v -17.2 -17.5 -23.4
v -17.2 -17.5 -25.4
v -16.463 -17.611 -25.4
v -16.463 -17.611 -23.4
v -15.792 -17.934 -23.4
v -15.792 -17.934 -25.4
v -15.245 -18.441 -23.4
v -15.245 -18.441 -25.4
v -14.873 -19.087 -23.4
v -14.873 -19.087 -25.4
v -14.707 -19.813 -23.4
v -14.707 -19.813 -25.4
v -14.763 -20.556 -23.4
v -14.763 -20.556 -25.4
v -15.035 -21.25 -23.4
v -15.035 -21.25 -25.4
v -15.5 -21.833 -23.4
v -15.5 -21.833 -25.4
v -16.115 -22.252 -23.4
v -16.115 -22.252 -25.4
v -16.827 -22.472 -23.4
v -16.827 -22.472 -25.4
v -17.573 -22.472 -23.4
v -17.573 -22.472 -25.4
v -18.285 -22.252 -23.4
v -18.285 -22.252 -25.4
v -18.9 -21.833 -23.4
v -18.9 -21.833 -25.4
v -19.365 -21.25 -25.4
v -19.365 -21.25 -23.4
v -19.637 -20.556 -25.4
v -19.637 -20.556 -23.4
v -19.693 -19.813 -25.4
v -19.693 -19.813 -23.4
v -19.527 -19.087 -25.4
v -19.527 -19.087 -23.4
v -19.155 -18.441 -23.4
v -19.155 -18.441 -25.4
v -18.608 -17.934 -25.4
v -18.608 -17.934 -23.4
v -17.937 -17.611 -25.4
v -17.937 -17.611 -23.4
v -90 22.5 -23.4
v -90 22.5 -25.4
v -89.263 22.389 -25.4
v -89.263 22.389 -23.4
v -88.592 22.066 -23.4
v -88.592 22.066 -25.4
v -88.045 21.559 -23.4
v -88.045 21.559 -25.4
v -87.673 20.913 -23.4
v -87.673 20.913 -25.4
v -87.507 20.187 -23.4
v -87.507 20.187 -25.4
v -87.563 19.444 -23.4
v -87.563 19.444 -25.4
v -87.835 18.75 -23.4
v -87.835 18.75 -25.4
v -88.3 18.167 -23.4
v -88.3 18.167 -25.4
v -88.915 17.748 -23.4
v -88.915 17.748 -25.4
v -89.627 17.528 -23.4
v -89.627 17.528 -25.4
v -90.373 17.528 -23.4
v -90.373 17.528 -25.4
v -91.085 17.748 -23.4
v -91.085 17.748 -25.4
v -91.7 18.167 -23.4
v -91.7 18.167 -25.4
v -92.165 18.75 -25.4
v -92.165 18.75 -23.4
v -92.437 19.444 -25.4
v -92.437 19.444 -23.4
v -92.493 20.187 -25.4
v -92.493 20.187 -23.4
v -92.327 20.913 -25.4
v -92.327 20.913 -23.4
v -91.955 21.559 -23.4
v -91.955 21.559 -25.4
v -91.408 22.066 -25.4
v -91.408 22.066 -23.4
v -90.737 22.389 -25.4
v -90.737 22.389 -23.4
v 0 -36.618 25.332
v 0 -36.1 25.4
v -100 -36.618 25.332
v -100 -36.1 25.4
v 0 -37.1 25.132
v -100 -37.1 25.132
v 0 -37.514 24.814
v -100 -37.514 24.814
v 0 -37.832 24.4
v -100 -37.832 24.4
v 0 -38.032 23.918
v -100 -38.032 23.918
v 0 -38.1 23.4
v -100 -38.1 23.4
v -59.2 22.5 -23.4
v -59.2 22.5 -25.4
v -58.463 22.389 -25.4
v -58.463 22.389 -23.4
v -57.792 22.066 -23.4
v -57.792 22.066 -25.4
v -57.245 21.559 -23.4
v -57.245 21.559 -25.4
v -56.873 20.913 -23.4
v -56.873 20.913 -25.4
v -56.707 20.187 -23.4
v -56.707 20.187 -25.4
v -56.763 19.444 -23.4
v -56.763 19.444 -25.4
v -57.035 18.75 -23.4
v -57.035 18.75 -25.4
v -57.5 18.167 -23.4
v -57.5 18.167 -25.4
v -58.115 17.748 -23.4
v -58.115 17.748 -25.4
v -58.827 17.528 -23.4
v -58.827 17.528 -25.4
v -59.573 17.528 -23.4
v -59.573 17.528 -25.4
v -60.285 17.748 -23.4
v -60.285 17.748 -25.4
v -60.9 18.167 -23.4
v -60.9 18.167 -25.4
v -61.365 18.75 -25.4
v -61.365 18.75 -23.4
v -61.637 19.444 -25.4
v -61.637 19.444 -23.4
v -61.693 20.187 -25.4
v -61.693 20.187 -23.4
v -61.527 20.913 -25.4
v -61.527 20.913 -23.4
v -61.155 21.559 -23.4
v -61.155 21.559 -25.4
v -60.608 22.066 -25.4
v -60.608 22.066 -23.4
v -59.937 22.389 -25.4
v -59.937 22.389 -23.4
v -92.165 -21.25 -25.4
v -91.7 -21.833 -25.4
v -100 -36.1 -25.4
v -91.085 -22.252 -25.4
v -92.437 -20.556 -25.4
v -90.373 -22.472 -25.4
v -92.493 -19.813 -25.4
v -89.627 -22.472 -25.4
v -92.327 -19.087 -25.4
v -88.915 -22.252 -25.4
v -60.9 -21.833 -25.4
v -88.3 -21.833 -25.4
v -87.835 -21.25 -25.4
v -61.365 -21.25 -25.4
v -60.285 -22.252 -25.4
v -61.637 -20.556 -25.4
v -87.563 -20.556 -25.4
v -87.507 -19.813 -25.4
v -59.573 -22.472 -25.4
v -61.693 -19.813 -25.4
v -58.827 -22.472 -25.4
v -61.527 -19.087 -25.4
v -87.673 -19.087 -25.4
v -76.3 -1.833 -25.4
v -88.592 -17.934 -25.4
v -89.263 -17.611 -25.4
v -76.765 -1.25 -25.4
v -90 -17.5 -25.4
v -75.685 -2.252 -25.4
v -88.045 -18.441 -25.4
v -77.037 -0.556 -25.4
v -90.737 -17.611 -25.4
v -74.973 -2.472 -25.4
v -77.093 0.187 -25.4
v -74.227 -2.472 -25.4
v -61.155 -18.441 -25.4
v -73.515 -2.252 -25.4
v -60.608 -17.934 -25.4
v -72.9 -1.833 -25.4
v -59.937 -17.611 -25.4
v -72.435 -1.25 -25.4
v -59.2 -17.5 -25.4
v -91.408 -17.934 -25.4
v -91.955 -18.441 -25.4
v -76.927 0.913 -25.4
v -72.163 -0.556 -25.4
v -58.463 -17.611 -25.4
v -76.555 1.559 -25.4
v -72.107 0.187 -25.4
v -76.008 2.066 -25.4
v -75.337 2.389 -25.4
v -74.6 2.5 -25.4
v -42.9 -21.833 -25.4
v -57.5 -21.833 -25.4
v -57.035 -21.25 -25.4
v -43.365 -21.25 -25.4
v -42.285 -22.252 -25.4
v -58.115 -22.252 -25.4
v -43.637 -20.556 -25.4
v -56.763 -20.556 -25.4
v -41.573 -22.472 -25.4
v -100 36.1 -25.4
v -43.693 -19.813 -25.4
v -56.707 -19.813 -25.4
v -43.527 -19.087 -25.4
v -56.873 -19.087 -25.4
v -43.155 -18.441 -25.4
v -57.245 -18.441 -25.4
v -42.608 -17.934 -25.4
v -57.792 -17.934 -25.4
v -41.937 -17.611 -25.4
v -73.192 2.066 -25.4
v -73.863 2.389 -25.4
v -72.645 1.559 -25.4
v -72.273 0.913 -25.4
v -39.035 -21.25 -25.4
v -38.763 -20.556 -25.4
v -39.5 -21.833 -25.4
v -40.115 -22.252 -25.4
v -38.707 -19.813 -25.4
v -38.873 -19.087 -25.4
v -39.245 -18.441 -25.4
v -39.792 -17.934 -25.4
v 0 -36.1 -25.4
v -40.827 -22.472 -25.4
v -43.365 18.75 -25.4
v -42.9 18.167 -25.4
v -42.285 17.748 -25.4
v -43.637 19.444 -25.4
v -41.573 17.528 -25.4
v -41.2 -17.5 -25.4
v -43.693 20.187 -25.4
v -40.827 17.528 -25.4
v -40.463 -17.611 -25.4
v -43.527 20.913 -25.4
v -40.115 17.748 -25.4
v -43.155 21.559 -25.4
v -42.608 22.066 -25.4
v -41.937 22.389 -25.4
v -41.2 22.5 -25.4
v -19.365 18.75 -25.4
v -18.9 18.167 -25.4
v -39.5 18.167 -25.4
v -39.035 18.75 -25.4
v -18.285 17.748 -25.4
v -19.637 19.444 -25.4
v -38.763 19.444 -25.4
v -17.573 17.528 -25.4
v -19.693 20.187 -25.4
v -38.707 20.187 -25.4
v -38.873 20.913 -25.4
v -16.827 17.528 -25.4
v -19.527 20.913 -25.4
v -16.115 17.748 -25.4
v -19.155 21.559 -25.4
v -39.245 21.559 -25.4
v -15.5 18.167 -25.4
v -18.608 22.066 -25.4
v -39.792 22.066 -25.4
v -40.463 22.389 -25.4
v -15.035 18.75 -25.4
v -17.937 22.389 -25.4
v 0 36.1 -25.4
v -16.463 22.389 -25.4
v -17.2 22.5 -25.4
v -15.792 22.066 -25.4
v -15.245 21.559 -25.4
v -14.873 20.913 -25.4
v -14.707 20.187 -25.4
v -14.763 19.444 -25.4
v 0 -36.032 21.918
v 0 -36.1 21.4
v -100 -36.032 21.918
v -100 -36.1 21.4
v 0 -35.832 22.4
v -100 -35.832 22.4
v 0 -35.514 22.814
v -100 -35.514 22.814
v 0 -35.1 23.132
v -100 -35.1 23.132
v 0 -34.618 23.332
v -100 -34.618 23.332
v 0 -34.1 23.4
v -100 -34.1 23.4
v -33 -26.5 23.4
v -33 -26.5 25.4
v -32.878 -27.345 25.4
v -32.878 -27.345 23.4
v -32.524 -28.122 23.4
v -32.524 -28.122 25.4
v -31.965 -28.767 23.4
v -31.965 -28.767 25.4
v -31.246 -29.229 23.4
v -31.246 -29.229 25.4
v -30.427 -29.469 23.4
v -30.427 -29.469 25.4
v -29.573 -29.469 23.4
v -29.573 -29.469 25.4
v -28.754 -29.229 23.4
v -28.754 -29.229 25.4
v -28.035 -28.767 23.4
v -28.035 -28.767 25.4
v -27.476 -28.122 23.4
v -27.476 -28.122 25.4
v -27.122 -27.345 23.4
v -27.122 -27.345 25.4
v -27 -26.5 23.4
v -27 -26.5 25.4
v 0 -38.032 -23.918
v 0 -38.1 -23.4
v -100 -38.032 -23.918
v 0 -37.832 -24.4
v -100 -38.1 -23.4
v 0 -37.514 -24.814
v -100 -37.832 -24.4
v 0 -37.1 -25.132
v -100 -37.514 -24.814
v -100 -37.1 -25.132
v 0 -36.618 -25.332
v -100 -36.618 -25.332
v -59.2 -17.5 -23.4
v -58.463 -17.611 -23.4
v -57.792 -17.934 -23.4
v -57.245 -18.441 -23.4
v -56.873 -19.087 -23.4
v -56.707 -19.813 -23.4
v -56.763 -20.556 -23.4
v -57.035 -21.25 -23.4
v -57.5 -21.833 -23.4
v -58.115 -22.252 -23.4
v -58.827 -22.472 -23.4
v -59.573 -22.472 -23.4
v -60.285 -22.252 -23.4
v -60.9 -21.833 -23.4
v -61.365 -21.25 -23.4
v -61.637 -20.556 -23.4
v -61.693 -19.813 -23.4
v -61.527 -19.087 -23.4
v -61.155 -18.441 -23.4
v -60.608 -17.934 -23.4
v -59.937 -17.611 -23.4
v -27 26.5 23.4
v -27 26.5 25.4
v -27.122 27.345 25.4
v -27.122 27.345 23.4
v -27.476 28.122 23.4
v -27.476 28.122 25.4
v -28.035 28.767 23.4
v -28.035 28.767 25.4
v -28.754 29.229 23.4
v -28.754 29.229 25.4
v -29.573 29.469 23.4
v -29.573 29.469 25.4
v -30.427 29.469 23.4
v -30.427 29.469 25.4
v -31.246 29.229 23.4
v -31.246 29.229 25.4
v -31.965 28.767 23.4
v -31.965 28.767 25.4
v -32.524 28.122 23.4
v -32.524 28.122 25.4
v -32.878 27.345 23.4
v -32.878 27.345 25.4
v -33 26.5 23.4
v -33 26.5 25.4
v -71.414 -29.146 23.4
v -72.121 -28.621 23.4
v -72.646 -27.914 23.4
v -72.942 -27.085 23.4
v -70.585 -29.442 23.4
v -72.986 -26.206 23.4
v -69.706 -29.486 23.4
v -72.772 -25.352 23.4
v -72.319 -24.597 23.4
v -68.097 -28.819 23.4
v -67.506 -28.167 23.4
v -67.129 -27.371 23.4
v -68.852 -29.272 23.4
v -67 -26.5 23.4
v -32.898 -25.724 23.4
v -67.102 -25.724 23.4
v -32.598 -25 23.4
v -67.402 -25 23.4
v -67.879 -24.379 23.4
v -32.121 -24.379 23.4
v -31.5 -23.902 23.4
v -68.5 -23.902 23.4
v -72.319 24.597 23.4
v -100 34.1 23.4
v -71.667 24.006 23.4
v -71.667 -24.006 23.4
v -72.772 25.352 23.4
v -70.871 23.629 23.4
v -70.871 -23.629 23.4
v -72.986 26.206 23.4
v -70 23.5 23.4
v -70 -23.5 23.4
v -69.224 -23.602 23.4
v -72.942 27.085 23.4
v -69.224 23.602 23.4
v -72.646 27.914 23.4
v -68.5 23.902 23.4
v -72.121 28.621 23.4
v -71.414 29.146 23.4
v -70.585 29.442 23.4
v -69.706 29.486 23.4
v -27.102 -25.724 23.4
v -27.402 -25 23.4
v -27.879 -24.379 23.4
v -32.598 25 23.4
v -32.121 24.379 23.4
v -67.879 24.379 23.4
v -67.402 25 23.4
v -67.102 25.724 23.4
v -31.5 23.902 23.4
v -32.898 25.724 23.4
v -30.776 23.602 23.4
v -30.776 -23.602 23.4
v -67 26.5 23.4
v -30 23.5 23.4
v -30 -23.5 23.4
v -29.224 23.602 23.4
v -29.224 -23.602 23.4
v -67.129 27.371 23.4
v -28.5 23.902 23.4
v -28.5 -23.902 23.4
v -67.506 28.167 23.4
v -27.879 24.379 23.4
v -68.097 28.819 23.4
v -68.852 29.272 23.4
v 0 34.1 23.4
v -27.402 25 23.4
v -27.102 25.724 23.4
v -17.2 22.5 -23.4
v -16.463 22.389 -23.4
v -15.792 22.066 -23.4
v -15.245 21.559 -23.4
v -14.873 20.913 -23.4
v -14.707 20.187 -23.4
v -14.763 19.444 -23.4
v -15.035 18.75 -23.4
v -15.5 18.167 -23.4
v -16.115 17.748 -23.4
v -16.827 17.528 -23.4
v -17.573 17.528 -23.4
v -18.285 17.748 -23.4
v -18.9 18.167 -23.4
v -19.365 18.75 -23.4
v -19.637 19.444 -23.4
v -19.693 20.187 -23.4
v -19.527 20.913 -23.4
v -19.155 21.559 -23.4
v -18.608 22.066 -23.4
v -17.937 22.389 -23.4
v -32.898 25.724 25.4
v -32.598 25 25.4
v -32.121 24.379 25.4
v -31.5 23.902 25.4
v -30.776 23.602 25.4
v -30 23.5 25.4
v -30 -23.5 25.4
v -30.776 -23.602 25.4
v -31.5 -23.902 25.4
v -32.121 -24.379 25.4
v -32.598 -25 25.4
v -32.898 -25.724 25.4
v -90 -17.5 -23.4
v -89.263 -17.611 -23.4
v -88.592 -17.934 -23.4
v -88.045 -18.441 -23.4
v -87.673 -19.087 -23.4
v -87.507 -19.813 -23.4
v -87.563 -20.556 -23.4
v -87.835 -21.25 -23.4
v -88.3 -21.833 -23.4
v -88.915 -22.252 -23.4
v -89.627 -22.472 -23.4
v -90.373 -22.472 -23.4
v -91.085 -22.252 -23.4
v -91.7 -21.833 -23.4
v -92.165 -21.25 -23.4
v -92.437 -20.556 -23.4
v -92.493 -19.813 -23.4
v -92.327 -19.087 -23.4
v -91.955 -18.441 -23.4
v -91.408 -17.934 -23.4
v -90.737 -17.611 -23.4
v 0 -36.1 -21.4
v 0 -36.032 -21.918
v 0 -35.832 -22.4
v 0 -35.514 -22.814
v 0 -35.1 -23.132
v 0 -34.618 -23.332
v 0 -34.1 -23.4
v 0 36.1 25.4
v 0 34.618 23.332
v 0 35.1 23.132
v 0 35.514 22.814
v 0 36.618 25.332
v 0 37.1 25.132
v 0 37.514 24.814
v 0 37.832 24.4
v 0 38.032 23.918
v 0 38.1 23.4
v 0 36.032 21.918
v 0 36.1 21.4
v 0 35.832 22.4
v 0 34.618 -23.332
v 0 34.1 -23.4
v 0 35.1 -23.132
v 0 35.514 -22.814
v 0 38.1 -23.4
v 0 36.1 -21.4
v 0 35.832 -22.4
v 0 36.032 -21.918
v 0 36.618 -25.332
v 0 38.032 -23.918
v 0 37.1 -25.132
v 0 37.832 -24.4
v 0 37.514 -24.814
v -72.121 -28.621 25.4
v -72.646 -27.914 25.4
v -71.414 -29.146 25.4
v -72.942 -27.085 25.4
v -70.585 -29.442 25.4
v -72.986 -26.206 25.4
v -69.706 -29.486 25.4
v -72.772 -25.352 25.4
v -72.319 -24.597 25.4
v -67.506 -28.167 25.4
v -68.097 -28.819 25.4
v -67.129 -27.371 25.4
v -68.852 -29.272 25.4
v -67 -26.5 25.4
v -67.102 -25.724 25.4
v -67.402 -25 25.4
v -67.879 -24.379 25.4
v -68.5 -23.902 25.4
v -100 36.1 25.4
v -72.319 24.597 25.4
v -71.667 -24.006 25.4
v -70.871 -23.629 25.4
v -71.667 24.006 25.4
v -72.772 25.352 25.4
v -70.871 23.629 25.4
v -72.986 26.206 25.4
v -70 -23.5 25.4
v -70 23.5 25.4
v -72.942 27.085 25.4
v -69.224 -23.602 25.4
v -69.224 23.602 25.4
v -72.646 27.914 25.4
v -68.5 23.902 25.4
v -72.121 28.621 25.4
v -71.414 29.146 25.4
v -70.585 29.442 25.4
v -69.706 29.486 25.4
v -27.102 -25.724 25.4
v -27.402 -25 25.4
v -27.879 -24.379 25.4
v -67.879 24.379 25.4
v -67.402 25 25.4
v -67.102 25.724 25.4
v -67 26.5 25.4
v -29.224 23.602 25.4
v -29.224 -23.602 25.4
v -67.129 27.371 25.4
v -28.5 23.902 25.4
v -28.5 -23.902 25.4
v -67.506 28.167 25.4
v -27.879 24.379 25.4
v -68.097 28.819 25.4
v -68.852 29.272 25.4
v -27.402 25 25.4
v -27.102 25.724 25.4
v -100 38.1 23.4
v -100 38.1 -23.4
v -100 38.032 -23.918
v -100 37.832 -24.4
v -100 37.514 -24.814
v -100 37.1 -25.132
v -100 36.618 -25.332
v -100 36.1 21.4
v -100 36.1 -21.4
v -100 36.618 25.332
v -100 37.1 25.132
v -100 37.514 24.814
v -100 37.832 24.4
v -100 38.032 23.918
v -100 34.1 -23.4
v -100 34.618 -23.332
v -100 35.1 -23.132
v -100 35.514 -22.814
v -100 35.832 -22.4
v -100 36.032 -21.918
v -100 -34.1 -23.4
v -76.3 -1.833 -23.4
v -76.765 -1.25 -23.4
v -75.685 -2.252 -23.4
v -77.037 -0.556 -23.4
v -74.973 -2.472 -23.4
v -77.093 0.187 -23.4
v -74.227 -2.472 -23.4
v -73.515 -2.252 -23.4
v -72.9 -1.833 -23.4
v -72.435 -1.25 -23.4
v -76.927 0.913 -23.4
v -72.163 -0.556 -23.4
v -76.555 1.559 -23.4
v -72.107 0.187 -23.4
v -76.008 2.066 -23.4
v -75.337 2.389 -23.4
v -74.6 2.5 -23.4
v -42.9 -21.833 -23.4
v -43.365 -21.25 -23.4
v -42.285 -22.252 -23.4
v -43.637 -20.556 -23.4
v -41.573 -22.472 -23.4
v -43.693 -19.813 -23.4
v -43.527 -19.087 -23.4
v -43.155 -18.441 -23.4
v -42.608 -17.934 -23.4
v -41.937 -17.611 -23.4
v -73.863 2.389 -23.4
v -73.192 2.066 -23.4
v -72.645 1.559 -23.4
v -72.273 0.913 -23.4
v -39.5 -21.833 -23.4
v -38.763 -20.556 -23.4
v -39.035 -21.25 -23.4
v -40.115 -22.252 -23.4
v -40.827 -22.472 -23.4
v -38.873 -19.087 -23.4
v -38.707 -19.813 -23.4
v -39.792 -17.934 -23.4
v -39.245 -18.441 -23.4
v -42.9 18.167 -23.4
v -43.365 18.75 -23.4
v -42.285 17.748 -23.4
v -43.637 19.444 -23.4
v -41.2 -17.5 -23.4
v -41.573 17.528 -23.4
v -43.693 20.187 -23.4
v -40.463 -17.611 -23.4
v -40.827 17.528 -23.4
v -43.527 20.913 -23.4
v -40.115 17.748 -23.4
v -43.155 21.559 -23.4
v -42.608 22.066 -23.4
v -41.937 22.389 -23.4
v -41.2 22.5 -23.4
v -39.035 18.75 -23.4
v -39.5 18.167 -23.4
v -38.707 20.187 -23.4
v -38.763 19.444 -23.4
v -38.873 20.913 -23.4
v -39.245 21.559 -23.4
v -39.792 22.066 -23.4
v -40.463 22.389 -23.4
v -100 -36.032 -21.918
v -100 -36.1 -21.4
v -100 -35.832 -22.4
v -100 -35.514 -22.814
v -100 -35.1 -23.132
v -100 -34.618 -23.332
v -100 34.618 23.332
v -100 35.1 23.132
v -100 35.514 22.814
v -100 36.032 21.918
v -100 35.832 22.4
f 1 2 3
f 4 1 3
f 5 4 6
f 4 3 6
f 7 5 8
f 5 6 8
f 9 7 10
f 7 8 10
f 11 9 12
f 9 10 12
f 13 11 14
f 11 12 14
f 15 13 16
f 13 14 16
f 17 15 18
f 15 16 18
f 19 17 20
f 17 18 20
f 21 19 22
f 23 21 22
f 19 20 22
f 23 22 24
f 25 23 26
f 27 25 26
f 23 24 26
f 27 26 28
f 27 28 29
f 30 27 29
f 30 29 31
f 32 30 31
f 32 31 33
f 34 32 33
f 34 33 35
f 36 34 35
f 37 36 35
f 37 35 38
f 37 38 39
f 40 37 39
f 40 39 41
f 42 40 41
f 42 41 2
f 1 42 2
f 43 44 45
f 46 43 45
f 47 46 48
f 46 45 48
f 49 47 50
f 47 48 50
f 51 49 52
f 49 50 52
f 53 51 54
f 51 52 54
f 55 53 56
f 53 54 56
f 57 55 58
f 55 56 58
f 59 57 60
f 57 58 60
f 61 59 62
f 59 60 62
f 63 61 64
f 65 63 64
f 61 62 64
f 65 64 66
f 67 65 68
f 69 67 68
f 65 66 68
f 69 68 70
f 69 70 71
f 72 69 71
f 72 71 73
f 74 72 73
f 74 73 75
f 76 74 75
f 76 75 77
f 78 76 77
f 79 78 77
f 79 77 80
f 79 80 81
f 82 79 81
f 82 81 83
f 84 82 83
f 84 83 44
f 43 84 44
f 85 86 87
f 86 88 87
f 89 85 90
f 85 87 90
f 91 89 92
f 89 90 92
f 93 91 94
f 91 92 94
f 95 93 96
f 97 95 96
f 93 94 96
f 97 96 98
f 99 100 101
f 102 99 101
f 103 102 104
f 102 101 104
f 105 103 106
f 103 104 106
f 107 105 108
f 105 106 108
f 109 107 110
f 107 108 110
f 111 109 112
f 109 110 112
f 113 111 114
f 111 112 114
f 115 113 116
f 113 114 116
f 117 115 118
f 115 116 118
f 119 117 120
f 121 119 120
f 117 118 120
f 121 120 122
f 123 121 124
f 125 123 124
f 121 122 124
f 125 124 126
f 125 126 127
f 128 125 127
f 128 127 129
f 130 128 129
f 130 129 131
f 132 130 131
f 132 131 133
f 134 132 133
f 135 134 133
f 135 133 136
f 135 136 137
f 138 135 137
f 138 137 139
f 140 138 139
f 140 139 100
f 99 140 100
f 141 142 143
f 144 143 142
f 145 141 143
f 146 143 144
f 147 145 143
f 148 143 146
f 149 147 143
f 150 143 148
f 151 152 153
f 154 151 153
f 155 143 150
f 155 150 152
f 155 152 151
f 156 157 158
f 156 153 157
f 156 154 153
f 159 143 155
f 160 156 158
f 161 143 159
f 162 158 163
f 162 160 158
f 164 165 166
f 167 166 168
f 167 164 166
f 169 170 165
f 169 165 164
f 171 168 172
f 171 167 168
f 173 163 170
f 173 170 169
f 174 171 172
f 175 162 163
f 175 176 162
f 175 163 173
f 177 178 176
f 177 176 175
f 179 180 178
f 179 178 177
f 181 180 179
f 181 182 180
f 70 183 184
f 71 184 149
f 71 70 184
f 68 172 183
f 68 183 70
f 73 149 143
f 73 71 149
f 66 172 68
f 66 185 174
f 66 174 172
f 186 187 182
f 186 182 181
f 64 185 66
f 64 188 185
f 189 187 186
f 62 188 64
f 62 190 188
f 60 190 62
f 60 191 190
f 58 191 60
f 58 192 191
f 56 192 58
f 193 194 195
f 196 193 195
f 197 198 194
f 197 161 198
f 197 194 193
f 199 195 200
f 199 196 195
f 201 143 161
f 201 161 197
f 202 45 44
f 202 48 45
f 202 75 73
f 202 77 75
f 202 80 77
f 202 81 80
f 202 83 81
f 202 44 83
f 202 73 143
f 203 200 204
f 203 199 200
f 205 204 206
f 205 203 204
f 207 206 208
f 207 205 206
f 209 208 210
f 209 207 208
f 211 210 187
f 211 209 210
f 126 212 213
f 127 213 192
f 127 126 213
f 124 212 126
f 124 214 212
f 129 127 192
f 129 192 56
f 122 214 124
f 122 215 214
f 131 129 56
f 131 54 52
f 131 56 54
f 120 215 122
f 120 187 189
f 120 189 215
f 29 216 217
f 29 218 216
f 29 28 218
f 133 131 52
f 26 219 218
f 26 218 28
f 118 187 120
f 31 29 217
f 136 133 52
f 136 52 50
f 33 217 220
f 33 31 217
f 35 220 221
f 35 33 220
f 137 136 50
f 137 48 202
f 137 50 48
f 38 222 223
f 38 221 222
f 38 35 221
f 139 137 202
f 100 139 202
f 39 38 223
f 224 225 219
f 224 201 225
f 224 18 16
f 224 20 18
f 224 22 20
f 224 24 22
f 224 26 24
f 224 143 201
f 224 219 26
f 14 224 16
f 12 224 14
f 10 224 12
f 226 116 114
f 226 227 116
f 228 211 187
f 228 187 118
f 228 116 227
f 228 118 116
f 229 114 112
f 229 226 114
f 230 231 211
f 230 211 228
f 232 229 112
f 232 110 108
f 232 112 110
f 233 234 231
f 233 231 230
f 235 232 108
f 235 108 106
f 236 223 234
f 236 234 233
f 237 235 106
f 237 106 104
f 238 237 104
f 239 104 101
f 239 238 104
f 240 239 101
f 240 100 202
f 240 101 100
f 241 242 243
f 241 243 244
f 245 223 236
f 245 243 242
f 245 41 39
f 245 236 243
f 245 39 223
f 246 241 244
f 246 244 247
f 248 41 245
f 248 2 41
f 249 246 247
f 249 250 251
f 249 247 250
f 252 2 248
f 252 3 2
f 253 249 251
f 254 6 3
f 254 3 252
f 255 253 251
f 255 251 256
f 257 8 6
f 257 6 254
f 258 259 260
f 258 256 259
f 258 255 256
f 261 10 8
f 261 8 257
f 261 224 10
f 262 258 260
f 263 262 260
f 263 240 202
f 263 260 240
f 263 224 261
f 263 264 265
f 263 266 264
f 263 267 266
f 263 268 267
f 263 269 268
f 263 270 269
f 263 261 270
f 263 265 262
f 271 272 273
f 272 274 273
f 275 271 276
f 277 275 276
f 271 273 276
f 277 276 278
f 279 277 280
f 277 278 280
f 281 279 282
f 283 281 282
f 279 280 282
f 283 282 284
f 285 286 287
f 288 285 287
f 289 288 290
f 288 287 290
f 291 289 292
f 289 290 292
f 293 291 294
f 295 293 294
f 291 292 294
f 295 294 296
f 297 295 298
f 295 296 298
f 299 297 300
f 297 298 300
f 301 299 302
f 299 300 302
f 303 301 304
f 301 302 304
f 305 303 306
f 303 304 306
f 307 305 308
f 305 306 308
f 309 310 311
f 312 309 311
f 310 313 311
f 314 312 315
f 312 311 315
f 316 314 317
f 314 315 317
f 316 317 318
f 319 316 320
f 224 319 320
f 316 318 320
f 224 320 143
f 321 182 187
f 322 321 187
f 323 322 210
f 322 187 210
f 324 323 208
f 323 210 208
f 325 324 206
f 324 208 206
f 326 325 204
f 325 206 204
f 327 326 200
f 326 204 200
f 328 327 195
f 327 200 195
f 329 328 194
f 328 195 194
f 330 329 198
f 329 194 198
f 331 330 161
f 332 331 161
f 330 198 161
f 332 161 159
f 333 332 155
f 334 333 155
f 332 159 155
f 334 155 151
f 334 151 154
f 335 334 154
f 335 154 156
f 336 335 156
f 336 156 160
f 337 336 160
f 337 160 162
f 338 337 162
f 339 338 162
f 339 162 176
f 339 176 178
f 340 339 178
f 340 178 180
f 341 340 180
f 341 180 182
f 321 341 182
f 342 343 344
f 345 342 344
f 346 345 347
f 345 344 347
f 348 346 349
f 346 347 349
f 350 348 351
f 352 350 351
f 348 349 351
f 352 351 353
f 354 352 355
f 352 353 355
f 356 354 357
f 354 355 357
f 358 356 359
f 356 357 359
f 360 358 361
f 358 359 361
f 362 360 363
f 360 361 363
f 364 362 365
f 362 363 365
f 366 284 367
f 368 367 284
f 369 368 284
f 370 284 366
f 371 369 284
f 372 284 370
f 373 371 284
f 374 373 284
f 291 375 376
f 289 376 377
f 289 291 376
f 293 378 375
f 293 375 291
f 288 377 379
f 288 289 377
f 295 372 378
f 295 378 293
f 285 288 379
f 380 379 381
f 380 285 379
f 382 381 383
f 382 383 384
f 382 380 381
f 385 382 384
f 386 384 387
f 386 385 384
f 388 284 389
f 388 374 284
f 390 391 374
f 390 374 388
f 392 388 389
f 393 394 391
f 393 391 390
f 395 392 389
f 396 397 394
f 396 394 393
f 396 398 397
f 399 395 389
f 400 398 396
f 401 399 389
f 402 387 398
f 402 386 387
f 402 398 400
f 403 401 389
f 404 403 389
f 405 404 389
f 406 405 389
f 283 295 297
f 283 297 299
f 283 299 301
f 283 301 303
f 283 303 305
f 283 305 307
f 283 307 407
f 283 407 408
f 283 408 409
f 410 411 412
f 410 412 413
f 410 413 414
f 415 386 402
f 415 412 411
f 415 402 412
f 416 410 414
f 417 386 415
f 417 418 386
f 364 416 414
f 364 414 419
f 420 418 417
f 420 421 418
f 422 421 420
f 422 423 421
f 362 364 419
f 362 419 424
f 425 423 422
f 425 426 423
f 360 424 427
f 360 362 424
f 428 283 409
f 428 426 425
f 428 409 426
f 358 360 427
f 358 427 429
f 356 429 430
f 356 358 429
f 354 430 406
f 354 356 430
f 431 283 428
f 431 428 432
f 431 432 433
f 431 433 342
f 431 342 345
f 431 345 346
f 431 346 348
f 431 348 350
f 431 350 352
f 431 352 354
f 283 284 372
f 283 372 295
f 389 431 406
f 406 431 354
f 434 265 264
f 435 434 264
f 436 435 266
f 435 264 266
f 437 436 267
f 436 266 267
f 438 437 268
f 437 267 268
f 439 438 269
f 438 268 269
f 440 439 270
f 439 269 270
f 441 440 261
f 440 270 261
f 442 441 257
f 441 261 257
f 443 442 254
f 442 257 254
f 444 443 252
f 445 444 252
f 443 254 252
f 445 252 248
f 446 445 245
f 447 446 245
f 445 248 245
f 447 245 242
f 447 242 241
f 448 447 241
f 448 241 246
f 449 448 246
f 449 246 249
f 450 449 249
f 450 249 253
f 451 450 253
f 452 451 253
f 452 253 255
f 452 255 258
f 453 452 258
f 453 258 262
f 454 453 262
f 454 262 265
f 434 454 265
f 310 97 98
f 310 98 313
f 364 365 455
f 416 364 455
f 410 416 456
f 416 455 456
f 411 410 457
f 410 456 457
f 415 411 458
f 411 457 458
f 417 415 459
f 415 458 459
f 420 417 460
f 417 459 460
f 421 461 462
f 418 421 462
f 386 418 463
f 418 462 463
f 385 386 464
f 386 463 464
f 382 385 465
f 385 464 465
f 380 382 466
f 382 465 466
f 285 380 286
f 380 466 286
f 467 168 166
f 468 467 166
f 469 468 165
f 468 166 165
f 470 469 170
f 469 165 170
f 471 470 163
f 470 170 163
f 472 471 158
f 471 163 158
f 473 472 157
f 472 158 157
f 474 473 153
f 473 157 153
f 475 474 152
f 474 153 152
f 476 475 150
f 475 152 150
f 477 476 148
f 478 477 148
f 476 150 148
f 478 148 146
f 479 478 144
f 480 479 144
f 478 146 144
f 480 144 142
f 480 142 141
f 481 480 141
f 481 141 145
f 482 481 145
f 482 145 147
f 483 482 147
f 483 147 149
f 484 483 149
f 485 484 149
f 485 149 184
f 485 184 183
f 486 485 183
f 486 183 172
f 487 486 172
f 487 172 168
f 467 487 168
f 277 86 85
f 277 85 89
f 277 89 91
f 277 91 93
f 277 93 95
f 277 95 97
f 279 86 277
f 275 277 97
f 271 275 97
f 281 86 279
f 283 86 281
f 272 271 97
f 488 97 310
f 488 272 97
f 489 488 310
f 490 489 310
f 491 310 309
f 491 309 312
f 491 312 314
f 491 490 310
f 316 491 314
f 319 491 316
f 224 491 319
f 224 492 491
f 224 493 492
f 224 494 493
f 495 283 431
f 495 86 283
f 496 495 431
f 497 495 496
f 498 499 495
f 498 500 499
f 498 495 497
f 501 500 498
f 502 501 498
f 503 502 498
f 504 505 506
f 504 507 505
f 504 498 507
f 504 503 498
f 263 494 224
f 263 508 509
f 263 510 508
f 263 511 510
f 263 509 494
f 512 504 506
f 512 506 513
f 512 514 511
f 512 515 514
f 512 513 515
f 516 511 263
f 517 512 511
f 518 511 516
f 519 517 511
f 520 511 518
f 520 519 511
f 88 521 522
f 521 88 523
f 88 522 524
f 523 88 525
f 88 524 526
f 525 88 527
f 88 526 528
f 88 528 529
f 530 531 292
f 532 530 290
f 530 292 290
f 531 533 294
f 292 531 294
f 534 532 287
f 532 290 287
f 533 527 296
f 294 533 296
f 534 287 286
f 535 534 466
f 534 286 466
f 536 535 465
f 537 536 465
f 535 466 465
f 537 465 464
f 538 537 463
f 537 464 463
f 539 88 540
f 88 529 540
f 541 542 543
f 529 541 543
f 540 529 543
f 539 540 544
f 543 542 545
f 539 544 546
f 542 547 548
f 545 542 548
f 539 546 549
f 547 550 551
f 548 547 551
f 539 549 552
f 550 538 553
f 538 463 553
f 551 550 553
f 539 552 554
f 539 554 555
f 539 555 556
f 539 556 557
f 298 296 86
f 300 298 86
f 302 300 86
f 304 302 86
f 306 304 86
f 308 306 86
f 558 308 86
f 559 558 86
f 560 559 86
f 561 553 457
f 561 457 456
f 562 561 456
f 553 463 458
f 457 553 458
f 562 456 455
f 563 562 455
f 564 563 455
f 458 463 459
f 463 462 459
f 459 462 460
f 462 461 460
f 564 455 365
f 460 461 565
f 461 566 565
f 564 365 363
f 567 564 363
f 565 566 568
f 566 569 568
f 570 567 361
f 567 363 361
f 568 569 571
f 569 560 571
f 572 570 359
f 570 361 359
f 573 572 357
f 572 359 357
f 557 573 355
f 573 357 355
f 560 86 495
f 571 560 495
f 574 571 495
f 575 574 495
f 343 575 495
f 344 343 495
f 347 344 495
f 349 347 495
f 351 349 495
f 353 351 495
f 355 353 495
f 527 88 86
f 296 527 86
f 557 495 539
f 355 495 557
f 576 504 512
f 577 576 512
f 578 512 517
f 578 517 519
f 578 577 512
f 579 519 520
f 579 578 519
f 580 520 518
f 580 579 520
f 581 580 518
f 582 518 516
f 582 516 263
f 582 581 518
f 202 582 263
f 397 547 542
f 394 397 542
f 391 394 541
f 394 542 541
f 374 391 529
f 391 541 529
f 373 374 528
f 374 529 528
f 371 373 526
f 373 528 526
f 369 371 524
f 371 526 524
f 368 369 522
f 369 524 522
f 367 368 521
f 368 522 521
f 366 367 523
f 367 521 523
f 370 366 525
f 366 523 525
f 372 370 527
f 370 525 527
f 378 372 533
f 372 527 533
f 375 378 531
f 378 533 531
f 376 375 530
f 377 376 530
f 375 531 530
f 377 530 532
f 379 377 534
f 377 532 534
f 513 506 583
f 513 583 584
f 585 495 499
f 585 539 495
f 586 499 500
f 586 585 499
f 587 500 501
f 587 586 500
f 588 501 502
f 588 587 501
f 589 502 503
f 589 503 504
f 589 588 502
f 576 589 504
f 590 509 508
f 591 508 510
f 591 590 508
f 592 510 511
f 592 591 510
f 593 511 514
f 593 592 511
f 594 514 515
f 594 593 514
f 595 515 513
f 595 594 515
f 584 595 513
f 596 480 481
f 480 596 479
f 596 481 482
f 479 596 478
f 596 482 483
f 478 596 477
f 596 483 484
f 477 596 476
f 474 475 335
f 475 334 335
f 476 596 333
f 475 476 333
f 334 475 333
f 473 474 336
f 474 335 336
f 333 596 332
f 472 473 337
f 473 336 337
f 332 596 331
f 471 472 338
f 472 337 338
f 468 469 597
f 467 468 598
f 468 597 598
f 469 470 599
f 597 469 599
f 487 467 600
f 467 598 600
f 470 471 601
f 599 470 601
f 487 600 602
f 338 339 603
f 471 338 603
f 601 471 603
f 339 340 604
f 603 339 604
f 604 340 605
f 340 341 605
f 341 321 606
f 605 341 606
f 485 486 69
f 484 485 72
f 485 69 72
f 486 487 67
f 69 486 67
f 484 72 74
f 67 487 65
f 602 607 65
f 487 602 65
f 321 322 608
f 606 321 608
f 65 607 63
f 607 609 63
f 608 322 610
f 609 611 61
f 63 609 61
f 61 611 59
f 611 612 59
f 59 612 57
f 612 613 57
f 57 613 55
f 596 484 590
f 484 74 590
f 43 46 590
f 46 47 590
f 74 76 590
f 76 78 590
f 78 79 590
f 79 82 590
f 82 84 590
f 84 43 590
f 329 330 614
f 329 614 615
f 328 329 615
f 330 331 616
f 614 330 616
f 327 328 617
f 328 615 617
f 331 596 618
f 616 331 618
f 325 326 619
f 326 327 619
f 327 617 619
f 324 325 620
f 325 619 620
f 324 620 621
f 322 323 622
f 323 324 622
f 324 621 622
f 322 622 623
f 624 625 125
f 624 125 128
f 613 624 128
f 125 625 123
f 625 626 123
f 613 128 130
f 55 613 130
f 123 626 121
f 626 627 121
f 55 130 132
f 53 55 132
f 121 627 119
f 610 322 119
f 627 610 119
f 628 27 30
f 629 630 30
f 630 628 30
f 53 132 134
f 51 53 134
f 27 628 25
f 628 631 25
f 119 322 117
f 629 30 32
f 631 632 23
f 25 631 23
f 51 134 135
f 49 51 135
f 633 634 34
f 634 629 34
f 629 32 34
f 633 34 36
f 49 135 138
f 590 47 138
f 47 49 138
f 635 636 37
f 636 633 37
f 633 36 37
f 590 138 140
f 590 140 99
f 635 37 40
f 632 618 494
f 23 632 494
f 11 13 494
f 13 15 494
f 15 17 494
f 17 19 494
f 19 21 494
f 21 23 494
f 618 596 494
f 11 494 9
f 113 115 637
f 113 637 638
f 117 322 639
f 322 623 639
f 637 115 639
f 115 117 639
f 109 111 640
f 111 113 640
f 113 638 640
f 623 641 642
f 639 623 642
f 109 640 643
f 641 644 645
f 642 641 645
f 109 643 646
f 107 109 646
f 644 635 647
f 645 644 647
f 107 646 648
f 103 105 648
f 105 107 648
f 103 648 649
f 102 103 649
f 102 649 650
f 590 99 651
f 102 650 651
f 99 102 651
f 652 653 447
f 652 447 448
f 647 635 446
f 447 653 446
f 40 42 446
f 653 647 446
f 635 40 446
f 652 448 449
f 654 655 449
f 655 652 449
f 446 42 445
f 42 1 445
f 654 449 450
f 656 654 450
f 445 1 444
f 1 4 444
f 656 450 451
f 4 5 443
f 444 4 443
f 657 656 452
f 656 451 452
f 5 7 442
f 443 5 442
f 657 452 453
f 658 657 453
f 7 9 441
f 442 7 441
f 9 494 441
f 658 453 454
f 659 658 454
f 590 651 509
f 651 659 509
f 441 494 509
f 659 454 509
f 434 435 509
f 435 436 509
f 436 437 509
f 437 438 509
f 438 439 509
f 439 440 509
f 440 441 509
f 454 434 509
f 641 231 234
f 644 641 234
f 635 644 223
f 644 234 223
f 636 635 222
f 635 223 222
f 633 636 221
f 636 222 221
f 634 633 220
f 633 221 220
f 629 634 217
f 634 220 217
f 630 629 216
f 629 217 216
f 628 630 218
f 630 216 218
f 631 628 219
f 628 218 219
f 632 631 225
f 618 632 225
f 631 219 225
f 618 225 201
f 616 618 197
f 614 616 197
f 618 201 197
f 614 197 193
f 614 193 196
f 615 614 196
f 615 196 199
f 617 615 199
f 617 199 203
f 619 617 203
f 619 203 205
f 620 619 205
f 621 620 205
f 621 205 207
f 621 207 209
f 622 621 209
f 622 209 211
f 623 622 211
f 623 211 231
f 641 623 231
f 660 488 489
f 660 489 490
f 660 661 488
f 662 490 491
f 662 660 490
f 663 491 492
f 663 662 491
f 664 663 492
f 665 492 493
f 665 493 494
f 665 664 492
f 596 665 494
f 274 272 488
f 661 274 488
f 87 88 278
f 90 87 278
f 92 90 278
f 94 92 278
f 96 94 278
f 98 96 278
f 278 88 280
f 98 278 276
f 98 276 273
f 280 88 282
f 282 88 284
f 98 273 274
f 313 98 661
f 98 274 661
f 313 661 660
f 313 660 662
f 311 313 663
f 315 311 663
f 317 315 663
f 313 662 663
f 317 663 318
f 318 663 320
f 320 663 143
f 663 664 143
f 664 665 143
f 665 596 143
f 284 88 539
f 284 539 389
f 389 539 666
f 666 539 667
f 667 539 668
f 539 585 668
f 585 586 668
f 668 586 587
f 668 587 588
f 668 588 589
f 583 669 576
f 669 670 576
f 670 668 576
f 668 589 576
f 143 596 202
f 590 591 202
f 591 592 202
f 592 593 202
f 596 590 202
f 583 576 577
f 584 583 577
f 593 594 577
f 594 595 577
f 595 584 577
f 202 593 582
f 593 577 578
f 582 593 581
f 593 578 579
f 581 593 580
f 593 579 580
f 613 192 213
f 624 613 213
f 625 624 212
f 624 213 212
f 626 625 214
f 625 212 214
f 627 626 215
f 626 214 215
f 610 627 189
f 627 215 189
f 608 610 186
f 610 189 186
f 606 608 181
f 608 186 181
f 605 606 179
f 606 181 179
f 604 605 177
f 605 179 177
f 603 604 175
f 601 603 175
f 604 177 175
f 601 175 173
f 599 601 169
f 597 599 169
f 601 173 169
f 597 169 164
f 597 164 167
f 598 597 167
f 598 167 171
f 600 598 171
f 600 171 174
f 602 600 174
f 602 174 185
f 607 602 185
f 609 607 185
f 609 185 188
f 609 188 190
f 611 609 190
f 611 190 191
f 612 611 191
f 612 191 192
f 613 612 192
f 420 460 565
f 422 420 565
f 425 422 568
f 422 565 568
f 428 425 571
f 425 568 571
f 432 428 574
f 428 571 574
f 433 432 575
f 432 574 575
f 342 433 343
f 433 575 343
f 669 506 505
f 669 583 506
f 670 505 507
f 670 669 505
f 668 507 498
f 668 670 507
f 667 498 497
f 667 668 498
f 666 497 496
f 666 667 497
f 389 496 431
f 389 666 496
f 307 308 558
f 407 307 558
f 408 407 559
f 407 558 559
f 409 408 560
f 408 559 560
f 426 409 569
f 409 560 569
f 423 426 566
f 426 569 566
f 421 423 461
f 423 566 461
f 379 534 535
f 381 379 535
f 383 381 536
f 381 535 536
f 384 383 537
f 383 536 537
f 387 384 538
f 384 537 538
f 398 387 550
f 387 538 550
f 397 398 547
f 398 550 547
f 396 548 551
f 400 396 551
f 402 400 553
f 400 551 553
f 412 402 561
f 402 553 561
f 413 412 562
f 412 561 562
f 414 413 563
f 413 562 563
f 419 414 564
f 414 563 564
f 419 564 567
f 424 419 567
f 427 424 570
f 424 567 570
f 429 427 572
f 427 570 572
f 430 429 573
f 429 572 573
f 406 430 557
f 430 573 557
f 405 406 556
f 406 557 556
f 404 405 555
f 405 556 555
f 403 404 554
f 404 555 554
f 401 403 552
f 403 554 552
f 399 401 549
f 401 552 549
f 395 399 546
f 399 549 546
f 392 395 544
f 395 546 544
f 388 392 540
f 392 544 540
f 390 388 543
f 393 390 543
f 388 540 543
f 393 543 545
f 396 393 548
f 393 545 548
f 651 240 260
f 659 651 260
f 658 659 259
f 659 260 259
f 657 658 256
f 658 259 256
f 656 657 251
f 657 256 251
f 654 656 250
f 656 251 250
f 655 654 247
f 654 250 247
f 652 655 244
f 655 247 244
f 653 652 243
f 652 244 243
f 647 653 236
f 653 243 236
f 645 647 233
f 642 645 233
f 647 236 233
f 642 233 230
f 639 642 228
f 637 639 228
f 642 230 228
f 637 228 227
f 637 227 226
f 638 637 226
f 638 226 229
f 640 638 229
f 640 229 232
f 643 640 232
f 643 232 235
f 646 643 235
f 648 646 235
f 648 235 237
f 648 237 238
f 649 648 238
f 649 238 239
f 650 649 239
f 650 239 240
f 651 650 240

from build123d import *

# Parameters (mm, degrees)
SKETCH1_W             = 50.8
SKETCH1_H             = 76.2
BOSS_EXTRUDE1_DEPTH   = 100
SKETCH2_W             = 46.8
SKETCH2_H             = 72.2
CUT_EXTRUDE1_DEPTH    = 110.985317202
FILLET2_R             = 2
CORTAR_EXTRUIR2_DEPTH = 10
CROQUIS4_R            = 2.5
CORTAR_EXTRUIR5_DEPTH = 10
CROQUIS6_R            = 2.5
CORTAR_EXTRUIR6_DEPTH = 10


with BuildPart() as part:
    # Sketch1 → Boss-Extrude1 (new body)
    with BuildSketch(Plane(origin=(0, 0, 0), x_dir=(0, 0, -1), z_dir=(1, 0, 0))):
        Rectangle(SKETCH1_W, SKETCH1_H)
    extrude(amount=-BOSS_EXTRUDE1_DEPTH)

    # Sketch2 → Cut-Extrude1 (cut, through all)
    with BuildSketch(Plane(origin=(0, 0, 0), x_dir=(0, 0, -1), z_dir=(1, 0, 0))):
        Rectangle(SKETCH2_W, SKETCH2_H)
    extrude(amount=-CUT_EXTRUDE1_DEPTH, mode=Mode.SUBTRACT)

    # Fillet2
    fillet2_edges = [part.edges().sort_by_distance(p)[0] for p in [
        (-50, -36.1, 23.4),
        (-50, 36.1, 23.4),
        (-50, 36.1, -23.4),
        (-50, -36.1, -23.4),
        (-50, 38.1, 25.4),
        (-50, 38.1, -25.4),
        (-50, -38.1, -25.4),
        (-50, -38.1, 25.4),
    ]]
    fillet(fillet2_edges, radius=FILLET2_R)

    # Croquis2 → Cortar-Extruir2 (cut)
    with BuildSketch(Plane.XY.offset(25.4)):
        with BuildLine():
            ThreePointArc((-27, 26.5), (-30, 29.5), (-33, 26.5))
            Line((-33, 26.5), (-30, 26.5))
            Line((-30, 26.5), (-30, 23.5))
            ThreePointArc((-30, 23.5), (-27.878679656, 24.378679656), (-27, 26.5))
        make_face()
        with BuildLine():
            Line((-30, 26.5), (-33, 26.5))
            ThreePointArc((-33, 26.5), (-32.121320344, 24.378679656), (-30, 23.5))
            Line((-30, 23.5), (-30, 26.5))
        make_face()
        with BuildLine():
            ThreePointArc((-70, 23.5), (-67.878679656, 24.378679656), (-67, 26.5))
            Line((-67, 26.5), (-70, 26.5))
            Line((-70, 26.5), (-70, 23.5))
        make_face()
        with BuildLine():
            Line((-70, 26.5), (-67, 26.5))
            ThreePointArc((-67, 26.5), (-72.121320344, 28.621320344), (-70, 23.5))
            Line((-70, 23.5), (-70, 26.5))
        make_face()
        with BuildLine():
            ThreePointArc((-67, -26.5), (-67.878679656, -24.378679656), (-70, -23.5))
            Line((-70, -23.5), (-70, -26.5))
            Line((-70, -26.5), (-67, -26.5))
        make_face()
        with BuildLine():
            Line((-70, -26.5), (-70, -23.5))
            ThreePointArc((-70, -23.5), (-72.121320344, -28.621320344), (-67, -26.5))
            Line((-67, -26.5), (-70, -26.5))
        make_face()
        with BuildLine():
            ThreePointArc((-27, -26.5), (-27.878679656, -24.378679656), (-30, -23.5))
            Line((-30, -23.5), (-30, -26.5))
            Line((-30, -26.5), (-33, -26.5))
            ThreePointArc((-33, -26.5), (-30, -29.5), (-27, -26.5))
        make_face()
        with BuildLine():
            Line((-30, -26.5), (-30, -23.5))
            ThreePointArc((-30, -23.5), (-32.121320344, -24.378679656), (-33, -26.5))
            Line((-33, -26.5), (-30, -26.5))
        make_face()
    extrude(amount=-CORTAR_EXTRUIR2_DEPTH, mode=Mode.SUBTRACT)

    # Croquis4 → Cortar-Extruir5 (cut)
    with BuildSketch(Plane(origin=(0, 0, -25.4), x_dir=(-1, 0, 0), z_dir=(0, 0, -1))):
        with Locations(Location((90, 20, 0), (0, 0, 90))):
            Circle(CROQUIS4_R)
        with Locations(Location((59.2, 20, 0), (0, 0, 90))):
            Circle(CROQUIS4_R)
        with Locations(Location((59.2, -20, 0), (0, 0, 90))):
            Circle(CROQUIS4_R)
        with Locations(Location((90, -20, 0), (0, 0, 90))):
            Circle(CROQUIS4_R)
        with Locations(Location((74.6, 0, 0), (0, 0, 90))):
            Circle(CROQUIS4_R)
    extrude(amount=-CORTAR_EXTRUIR5_DEPTH, mode=Mode.SUBTRACT)

    # Croquis6 → Cortar-Extruir6 (cut)
    with BuildSketch(Plane(origin=(0, 0, -25.4), x_dir=(-1, 0, 0), z_dir=(0, 0, -1))):
        with Locations(Location((17.2, 20, 0), (0, 0, 90))):
            Circle(CROQUIS6_R)
        with Locations(Location((17.2, -20, 0), (0, 0, 90))):
            Circle(CROQUIS6_R)
        with Locations(Location((41.2, -20, 0), (0, 0, 90))):
            Circle(CROQUIS6_R)
        with Locations(Location((41.2, 20, 0), (0, 0, 90))):
            Circle(CROQUIS6_R)
    extrude(amount=-CORTAR_EXTRUIR6_DEPTH, mode=Mode.SUBTRACT)


solid = part.part
